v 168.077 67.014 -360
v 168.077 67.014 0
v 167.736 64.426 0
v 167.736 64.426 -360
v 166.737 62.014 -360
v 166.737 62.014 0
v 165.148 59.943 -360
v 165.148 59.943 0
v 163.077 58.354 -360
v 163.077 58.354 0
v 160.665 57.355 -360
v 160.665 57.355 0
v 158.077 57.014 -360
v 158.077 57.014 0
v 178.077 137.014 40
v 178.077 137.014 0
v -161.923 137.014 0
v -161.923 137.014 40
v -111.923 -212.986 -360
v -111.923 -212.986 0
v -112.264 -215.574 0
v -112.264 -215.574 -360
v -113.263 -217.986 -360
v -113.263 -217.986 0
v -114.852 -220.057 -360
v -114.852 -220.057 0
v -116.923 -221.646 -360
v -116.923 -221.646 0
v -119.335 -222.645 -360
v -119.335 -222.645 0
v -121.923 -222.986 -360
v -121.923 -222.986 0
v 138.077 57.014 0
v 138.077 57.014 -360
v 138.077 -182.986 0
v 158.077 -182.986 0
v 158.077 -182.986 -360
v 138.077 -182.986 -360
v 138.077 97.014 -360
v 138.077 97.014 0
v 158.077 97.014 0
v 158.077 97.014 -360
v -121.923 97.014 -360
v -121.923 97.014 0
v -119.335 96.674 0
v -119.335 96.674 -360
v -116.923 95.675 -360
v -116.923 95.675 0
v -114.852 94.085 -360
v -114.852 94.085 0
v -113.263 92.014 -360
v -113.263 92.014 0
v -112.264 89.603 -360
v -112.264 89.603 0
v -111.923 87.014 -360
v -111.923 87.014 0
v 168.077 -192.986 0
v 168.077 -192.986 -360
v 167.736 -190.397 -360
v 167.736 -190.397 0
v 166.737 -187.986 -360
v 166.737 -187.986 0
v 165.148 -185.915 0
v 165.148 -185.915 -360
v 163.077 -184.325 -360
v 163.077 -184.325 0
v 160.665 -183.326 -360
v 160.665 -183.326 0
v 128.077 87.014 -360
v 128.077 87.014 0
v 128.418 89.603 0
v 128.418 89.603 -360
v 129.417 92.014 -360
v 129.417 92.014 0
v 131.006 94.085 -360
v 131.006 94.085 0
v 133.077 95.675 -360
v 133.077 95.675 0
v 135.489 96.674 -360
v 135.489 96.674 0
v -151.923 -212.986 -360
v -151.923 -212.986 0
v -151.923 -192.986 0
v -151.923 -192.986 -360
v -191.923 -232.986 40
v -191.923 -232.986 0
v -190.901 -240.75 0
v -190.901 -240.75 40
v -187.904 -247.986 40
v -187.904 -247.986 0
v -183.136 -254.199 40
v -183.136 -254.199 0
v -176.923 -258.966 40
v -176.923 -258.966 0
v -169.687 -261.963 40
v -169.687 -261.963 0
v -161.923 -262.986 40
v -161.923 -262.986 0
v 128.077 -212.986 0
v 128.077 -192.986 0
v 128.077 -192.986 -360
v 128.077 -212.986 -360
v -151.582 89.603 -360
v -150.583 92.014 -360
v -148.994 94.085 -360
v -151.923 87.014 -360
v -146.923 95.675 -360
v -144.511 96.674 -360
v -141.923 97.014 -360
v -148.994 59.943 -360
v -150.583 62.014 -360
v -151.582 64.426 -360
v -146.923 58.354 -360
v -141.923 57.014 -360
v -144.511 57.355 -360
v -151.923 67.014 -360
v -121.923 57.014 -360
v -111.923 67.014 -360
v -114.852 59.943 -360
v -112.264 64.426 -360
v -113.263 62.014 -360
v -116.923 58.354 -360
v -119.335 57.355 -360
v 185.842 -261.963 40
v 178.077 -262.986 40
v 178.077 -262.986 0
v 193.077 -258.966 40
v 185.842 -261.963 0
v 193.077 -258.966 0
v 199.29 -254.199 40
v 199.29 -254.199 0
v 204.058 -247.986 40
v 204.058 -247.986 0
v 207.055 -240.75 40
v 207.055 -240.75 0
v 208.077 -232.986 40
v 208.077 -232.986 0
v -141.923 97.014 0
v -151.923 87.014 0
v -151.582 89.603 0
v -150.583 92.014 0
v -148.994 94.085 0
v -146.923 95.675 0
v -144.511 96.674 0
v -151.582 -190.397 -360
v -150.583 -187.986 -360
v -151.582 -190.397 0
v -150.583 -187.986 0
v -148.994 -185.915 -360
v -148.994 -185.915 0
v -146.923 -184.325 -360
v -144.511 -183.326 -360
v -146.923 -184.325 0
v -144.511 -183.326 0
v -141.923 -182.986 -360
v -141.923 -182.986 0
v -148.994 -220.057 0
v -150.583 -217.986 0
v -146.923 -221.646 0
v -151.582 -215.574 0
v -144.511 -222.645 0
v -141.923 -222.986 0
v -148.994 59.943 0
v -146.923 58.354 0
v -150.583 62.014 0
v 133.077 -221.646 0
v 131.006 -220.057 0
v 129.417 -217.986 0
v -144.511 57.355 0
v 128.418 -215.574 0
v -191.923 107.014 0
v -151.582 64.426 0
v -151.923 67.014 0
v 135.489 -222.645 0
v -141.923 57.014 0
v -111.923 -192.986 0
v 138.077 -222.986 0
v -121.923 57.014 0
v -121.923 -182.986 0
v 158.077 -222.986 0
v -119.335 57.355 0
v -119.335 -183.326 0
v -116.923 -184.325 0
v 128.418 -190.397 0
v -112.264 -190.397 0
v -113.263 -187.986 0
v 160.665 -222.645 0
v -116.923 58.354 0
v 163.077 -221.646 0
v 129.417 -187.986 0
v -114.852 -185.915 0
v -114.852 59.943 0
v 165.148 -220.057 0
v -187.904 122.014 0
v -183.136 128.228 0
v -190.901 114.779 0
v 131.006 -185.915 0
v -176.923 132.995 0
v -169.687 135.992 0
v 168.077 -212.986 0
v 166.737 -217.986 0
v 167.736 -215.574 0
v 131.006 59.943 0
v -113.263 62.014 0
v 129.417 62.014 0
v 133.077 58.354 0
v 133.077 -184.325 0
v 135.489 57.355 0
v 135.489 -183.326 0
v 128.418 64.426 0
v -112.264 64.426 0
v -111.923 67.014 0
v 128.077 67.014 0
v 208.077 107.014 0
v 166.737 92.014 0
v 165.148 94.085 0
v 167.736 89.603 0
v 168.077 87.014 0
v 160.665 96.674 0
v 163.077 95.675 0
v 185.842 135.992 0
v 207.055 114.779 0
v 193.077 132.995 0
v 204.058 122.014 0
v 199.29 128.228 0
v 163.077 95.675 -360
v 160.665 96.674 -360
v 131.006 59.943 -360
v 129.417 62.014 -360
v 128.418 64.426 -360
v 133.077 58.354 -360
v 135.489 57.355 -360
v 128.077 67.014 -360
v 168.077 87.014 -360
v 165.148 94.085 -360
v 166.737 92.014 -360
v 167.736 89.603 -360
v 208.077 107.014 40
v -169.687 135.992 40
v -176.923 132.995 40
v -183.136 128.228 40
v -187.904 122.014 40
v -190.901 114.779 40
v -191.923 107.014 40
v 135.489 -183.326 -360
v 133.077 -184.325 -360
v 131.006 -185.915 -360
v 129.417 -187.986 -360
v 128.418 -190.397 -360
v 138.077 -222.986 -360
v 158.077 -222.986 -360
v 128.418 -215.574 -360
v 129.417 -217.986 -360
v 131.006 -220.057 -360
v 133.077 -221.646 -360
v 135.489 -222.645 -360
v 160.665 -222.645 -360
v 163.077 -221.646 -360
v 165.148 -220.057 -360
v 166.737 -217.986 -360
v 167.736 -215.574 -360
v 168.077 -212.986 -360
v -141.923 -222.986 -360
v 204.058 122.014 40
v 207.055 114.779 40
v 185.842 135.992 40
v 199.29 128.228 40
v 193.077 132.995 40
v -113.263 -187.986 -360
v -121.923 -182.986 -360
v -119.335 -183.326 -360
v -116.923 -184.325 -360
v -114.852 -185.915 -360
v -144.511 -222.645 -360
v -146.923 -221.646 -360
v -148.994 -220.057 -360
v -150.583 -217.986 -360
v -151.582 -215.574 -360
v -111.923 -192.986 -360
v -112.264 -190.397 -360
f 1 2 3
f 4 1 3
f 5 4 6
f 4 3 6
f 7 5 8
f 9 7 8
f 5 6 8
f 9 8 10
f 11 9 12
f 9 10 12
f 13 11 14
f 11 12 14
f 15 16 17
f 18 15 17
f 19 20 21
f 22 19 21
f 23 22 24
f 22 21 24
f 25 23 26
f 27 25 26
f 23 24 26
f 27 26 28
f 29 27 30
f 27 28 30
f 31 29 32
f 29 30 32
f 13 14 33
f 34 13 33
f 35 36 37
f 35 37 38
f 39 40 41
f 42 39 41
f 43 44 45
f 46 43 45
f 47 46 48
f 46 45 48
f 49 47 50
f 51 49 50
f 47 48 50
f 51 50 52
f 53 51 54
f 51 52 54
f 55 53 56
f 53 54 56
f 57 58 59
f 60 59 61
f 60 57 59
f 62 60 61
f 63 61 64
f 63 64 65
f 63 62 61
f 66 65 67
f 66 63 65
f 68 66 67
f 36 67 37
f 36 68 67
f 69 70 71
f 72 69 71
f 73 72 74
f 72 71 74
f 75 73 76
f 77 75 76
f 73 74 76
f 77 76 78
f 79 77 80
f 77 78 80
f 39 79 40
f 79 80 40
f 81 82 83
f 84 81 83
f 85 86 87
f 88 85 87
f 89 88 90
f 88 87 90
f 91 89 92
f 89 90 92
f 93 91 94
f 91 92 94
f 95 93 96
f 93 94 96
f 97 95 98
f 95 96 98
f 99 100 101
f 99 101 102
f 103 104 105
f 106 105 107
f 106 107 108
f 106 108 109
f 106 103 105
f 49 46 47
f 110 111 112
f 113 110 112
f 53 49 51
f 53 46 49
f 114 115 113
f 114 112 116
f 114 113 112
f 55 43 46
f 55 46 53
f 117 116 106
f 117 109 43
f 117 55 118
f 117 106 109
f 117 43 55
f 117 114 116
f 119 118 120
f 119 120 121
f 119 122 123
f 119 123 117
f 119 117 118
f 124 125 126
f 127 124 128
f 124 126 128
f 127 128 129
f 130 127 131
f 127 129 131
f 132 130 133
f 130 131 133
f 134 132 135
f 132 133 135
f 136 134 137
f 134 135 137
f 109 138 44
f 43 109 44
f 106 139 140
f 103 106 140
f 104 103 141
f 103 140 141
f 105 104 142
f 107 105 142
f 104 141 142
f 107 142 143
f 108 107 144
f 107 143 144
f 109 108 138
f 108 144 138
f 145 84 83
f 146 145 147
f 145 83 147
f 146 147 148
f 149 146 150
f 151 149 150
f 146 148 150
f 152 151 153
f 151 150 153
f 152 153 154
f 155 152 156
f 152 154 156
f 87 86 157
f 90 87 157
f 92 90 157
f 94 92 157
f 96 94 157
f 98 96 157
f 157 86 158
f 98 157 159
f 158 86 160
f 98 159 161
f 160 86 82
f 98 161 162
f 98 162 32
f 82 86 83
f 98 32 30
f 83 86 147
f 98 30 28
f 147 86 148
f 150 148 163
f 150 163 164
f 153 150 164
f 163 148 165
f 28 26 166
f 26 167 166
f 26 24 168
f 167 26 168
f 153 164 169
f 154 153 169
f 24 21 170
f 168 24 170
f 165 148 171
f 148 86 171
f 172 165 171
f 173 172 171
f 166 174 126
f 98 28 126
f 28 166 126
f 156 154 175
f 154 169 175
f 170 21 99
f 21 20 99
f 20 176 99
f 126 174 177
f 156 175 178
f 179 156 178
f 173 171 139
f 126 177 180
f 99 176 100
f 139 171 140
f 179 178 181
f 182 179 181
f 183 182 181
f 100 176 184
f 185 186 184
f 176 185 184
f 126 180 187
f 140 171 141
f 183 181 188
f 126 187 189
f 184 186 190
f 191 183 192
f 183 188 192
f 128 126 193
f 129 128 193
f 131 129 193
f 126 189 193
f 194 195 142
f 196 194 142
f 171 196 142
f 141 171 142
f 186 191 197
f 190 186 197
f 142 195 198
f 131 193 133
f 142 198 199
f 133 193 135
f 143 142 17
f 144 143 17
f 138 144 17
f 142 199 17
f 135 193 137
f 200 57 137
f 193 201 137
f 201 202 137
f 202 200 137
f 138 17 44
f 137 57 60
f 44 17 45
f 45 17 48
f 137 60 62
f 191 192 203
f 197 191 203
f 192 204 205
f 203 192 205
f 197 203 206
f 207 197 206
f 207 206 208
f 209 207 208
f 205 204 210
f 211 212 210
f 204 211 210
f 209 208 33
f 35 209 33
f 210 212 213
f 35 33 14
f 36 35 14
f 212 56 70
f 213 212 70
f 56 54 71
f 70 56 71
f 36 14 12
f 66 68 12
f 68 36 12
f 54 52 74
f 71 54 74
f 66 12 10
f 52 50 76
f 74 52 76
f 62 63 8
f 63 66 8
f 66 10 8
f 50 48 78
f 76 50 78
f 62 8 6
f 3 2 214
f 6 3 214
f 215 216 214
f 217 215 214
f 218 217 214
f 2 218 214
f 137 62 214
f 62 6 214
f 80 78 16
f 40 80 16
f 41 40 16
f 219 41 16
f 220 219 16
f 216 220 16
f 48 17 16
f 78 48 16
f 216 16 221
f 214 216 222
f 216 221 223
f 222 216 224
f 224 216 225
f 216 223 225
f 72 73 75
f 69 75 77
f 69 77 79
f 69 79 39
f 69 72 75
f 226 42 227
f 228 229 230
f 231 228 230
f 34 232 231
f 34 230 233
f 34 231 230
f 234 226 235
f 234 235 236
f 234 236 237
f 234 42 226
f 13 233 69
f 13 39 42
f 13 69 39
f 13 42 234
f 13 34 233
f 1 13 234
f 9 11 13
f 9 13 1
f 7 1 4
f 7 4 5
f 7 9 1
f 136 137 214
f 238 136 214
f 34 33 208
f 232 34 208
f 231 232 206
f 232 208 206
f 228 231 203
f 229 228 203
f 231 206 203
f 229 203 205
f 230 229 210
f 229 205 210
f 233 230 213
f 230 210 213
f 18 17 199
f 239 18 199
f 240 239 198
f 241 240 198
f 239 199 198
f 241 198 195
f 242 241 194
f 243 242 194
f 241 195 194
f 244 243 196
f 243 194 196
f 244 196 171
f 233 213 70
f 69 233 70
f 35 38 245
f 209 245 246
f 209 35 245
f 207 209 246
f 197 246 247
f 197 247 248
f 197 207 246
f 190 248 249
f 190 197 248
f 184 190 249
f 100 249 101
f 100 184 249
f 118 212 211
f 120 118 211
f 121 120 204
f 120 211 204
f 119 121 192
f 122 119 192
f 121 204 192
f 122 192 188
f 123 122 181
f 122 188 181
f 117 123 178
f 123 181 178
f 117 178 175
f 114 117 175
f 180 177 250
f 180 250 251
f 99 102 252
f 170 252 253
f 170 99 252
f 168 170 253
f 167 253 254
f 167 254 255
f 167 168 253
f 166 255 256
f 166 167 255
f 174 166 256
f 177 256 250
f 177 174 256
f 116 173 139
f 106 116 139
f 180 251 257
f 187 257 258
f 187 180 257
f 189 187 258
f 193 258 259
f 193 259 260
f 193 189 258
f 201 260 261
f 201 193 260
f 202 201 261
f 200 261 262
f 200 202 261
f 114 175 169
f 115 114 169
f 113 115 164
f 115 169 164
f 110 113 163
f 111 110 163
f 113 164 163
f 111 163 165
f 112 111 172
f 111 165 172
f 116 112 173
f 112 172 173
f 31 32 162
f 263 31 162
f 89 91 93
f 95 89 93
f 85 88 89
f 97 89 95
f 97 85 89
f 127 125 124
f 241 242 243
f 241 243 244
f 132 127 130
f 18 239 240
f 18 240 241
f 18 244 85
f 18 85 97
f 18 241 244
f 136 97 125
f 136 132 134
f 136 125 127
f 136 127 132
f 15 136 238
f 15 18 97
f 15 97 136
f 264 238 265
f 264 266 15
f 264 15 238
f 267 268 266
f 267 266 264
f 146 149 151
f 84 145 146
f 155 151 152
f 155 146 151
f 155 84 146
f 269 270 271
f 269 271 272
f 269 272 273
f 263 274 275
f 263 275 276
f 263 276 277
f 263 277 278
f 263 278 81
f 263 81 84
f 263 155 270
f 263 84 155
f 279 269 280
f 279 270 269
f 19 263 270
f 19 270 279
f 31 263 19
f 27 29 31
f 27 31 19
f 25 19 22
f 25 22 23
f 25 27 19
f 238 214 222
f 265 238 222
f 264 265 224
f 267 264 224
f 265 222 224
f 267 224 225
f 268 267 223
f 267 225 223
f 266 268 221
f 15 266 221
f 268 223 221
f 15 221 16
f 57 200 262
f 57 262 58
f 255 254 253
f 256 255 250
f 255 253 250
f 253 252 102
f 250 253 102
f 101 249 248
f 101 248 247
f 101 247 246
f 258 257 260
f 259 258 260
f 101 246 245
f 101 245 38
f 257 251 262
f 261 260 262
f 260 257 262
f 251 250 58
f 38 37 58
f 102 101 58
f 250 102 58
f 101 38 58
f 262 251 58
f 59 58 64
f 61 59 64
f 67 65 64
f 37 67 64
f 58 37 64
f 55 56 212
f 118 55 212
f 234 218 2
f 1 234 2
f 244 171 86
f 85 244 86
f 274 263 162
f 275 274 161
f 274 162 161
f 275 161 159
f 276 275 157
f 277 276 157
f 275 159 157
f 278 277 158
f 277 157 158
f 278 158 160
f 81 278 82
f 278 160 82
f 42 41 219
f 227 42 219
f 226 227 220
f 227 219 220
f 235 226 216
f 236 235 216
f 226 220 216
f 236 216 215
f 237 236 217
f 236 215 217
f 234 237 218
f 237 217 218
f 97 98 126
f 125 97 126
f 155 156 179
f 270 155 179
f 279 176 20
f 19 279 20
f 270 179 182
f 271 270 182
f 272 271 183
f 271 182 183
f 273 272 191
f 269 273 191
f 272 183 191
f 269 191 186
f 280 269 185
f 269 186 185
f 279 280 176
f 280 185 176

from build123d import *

# Parameters (mm, degrees)
F1_DEPTH = 40
F6_DEPTH = 360
F7_DEPTH = 360
F8_DEPTH = 360
F9_DEPTH = 360


with BuildPart() as f1:
    # F0 (on Top) → F1 (new body)
    with BuildSketch(Plane.XY):
        with BuildLine():
            Line((178.077192, 137.014396), (-161.922808, 137.014396))
            ThreePointArc((-161.922808, 137.014396), (-183.136011, 128.227599), (-191.922808, 107.014396))
            Line((-191.922808, 107.014396), (-191.922808, -232.985604))
            ThreePointArc((-191.922808, -232.985604), (-183.136011, -254.198808), (-161.922808, -262.985604))
            Line((-161.922808, -262.985604), (178.077192, -262.985604))
            ThreePointArc((178.077192, -262.985604), (199.290396, -254.198808), (208.077192, -232.985604))
            Line((208.077192, -232.985604), (208.077192, 107.014396))
            ThreePointArc((208.077192, 107.014396), (199.290396, 128.227599), (178.077192, 137.014396))
        make_face()
    extrude(amount=F1_DEPTH)

    # F2 (on face) → F6 (join)
    with BuildSketch(Plane(origin=(0, 0, 0), x_dir=(1, 0, 0), z_dir=(0, 0, -1))):
        with BuildLine():
            Line((-121.922808, -57.014396), (-141.922808, -57.014396))
            ThreePointArc((-141.922808, -57.014396), (-148.993876, -59.943328), (-151.922808, -67.014396))
            Line((-151.922808, -67.014396), (-151.922808, -87.014396))
            ThreePointArc((-151.922808, -87.014396), (-148.993876, -94.085464), (-141.922808, -97.014396))
            Line((-141.922808, -97.014396), (-121.922808, -97.014396))
            ThreePointArc((-121.922808, -97.014396), (-114.85174, -94.085464), (-111.922808, -87.014396))
            Line((-111.922808, -87.014396), (-111.922808, -67.014396))
            ThreePointArc((-111.922808, -67.014396), (-114.85174, -59.943328), (-121.922808, -57.014396))
        make_face()
    extrude(amount=F6_DEPTH)

    # F5 (on face) → F7 (join)
    with BuildSketch(Plane(origin=(0, 0, 0), x_dir=(1, 0, 0), z_dir=(0, 0, -1))):
        with BuildLine():
            Line((158.077192, -57.014396), (138.077192, -57.014396))
            ThreePointArc((138.077192, -57.014396), (131.006124, -59.943328), (128.077192, -67.014396))
            Line((128.077192, -67.014396), (128.077192, -87.014396))
            ThreePointArc((128.077192, -87.014396), (131.006124, -94.085464), (138.077192, -97.014396))
            Line((138.077192, -97.014396), (158.077192, -97.014396))
            ThreePointArc((158.077192, -97.014396), (165.14826, -94.085464), (168.077192, -87.014396))
            Line((168.077192, -87.014396), (168.077192, -67.014396))
            ThreePointArc((168.077192, -67.014396), (165.14826, -59.943328), (158.077192, -57.014396))
        make_face()
    extrude(amount=F7_DEPTH)

    # F3 (on face) → F8 (join)
    with BuildSketch(Plane(origin=(0, 0, 0), x_dir=(1, 0, 0), z_dir=(0, 0, -1))):
        with BuildLine():
            Line((-121.922808, 222.985604), (-141.922808, 222.985604))
            ThreePointArc((-141.922808, 222.985604), (-148.993876, 220.056672), (-151.922808, 212.985604))
            Line((-151.922808, 212.985604), (-151.922808, 192.985604))
            ThreePointArc((-151.922808, 192.985604), (-148.993876, 185.914536), (-141.922808, 182.985604))
            Line((-141.922808, 182.985604), (-121.922808, 182.985604))
            ThreePointArc((-121.922808, 182.985604), (-114.85174, 185.914536), (-111.922808, 192.985604))
            Line((-111.922808, 192.985604), (-111.922808, 212.985604))
            ThreePointArc((-111.922808, 212.985604), (-114.85174, 220.056672), (-121.922808, 222.985604))
        make_face()
    extrude(amount=F8_DEPTH)

    # F4 (on Top) → F9 (join)
    with BuildSketch(Plane.XY):
        with BuildLine():
            ThreePointArc((128.077192, -212.985604), (131.006124, -220.056672), (138.077192, -222.985604))
            Line((138.077192, -222.985604), (158.077192, -222.985604))
            ThreePointArc((158.077192, -222.985604), (165.14826, -220.056672), (168.077192, -212.985604))
            Line((168.077192, -212.985604), (168.077192, -192.985604))
            ThreePointArc((168.077192, -192.985604), (165.14826, -185.914536), (158.077192, -182.985604))
            Line((158.077192, -182.985604), (138.077192, -182.985604))
            ThreePointArc((138.077192, -182.985604), (131.006124, -185.914536), (128.077192, -192.985604))
            Line((128.077192, -192.985604), (128.077192, -212.985604))
        make_face()
    extrude(amount=-F9_DEPTH)


solid = f1.part
